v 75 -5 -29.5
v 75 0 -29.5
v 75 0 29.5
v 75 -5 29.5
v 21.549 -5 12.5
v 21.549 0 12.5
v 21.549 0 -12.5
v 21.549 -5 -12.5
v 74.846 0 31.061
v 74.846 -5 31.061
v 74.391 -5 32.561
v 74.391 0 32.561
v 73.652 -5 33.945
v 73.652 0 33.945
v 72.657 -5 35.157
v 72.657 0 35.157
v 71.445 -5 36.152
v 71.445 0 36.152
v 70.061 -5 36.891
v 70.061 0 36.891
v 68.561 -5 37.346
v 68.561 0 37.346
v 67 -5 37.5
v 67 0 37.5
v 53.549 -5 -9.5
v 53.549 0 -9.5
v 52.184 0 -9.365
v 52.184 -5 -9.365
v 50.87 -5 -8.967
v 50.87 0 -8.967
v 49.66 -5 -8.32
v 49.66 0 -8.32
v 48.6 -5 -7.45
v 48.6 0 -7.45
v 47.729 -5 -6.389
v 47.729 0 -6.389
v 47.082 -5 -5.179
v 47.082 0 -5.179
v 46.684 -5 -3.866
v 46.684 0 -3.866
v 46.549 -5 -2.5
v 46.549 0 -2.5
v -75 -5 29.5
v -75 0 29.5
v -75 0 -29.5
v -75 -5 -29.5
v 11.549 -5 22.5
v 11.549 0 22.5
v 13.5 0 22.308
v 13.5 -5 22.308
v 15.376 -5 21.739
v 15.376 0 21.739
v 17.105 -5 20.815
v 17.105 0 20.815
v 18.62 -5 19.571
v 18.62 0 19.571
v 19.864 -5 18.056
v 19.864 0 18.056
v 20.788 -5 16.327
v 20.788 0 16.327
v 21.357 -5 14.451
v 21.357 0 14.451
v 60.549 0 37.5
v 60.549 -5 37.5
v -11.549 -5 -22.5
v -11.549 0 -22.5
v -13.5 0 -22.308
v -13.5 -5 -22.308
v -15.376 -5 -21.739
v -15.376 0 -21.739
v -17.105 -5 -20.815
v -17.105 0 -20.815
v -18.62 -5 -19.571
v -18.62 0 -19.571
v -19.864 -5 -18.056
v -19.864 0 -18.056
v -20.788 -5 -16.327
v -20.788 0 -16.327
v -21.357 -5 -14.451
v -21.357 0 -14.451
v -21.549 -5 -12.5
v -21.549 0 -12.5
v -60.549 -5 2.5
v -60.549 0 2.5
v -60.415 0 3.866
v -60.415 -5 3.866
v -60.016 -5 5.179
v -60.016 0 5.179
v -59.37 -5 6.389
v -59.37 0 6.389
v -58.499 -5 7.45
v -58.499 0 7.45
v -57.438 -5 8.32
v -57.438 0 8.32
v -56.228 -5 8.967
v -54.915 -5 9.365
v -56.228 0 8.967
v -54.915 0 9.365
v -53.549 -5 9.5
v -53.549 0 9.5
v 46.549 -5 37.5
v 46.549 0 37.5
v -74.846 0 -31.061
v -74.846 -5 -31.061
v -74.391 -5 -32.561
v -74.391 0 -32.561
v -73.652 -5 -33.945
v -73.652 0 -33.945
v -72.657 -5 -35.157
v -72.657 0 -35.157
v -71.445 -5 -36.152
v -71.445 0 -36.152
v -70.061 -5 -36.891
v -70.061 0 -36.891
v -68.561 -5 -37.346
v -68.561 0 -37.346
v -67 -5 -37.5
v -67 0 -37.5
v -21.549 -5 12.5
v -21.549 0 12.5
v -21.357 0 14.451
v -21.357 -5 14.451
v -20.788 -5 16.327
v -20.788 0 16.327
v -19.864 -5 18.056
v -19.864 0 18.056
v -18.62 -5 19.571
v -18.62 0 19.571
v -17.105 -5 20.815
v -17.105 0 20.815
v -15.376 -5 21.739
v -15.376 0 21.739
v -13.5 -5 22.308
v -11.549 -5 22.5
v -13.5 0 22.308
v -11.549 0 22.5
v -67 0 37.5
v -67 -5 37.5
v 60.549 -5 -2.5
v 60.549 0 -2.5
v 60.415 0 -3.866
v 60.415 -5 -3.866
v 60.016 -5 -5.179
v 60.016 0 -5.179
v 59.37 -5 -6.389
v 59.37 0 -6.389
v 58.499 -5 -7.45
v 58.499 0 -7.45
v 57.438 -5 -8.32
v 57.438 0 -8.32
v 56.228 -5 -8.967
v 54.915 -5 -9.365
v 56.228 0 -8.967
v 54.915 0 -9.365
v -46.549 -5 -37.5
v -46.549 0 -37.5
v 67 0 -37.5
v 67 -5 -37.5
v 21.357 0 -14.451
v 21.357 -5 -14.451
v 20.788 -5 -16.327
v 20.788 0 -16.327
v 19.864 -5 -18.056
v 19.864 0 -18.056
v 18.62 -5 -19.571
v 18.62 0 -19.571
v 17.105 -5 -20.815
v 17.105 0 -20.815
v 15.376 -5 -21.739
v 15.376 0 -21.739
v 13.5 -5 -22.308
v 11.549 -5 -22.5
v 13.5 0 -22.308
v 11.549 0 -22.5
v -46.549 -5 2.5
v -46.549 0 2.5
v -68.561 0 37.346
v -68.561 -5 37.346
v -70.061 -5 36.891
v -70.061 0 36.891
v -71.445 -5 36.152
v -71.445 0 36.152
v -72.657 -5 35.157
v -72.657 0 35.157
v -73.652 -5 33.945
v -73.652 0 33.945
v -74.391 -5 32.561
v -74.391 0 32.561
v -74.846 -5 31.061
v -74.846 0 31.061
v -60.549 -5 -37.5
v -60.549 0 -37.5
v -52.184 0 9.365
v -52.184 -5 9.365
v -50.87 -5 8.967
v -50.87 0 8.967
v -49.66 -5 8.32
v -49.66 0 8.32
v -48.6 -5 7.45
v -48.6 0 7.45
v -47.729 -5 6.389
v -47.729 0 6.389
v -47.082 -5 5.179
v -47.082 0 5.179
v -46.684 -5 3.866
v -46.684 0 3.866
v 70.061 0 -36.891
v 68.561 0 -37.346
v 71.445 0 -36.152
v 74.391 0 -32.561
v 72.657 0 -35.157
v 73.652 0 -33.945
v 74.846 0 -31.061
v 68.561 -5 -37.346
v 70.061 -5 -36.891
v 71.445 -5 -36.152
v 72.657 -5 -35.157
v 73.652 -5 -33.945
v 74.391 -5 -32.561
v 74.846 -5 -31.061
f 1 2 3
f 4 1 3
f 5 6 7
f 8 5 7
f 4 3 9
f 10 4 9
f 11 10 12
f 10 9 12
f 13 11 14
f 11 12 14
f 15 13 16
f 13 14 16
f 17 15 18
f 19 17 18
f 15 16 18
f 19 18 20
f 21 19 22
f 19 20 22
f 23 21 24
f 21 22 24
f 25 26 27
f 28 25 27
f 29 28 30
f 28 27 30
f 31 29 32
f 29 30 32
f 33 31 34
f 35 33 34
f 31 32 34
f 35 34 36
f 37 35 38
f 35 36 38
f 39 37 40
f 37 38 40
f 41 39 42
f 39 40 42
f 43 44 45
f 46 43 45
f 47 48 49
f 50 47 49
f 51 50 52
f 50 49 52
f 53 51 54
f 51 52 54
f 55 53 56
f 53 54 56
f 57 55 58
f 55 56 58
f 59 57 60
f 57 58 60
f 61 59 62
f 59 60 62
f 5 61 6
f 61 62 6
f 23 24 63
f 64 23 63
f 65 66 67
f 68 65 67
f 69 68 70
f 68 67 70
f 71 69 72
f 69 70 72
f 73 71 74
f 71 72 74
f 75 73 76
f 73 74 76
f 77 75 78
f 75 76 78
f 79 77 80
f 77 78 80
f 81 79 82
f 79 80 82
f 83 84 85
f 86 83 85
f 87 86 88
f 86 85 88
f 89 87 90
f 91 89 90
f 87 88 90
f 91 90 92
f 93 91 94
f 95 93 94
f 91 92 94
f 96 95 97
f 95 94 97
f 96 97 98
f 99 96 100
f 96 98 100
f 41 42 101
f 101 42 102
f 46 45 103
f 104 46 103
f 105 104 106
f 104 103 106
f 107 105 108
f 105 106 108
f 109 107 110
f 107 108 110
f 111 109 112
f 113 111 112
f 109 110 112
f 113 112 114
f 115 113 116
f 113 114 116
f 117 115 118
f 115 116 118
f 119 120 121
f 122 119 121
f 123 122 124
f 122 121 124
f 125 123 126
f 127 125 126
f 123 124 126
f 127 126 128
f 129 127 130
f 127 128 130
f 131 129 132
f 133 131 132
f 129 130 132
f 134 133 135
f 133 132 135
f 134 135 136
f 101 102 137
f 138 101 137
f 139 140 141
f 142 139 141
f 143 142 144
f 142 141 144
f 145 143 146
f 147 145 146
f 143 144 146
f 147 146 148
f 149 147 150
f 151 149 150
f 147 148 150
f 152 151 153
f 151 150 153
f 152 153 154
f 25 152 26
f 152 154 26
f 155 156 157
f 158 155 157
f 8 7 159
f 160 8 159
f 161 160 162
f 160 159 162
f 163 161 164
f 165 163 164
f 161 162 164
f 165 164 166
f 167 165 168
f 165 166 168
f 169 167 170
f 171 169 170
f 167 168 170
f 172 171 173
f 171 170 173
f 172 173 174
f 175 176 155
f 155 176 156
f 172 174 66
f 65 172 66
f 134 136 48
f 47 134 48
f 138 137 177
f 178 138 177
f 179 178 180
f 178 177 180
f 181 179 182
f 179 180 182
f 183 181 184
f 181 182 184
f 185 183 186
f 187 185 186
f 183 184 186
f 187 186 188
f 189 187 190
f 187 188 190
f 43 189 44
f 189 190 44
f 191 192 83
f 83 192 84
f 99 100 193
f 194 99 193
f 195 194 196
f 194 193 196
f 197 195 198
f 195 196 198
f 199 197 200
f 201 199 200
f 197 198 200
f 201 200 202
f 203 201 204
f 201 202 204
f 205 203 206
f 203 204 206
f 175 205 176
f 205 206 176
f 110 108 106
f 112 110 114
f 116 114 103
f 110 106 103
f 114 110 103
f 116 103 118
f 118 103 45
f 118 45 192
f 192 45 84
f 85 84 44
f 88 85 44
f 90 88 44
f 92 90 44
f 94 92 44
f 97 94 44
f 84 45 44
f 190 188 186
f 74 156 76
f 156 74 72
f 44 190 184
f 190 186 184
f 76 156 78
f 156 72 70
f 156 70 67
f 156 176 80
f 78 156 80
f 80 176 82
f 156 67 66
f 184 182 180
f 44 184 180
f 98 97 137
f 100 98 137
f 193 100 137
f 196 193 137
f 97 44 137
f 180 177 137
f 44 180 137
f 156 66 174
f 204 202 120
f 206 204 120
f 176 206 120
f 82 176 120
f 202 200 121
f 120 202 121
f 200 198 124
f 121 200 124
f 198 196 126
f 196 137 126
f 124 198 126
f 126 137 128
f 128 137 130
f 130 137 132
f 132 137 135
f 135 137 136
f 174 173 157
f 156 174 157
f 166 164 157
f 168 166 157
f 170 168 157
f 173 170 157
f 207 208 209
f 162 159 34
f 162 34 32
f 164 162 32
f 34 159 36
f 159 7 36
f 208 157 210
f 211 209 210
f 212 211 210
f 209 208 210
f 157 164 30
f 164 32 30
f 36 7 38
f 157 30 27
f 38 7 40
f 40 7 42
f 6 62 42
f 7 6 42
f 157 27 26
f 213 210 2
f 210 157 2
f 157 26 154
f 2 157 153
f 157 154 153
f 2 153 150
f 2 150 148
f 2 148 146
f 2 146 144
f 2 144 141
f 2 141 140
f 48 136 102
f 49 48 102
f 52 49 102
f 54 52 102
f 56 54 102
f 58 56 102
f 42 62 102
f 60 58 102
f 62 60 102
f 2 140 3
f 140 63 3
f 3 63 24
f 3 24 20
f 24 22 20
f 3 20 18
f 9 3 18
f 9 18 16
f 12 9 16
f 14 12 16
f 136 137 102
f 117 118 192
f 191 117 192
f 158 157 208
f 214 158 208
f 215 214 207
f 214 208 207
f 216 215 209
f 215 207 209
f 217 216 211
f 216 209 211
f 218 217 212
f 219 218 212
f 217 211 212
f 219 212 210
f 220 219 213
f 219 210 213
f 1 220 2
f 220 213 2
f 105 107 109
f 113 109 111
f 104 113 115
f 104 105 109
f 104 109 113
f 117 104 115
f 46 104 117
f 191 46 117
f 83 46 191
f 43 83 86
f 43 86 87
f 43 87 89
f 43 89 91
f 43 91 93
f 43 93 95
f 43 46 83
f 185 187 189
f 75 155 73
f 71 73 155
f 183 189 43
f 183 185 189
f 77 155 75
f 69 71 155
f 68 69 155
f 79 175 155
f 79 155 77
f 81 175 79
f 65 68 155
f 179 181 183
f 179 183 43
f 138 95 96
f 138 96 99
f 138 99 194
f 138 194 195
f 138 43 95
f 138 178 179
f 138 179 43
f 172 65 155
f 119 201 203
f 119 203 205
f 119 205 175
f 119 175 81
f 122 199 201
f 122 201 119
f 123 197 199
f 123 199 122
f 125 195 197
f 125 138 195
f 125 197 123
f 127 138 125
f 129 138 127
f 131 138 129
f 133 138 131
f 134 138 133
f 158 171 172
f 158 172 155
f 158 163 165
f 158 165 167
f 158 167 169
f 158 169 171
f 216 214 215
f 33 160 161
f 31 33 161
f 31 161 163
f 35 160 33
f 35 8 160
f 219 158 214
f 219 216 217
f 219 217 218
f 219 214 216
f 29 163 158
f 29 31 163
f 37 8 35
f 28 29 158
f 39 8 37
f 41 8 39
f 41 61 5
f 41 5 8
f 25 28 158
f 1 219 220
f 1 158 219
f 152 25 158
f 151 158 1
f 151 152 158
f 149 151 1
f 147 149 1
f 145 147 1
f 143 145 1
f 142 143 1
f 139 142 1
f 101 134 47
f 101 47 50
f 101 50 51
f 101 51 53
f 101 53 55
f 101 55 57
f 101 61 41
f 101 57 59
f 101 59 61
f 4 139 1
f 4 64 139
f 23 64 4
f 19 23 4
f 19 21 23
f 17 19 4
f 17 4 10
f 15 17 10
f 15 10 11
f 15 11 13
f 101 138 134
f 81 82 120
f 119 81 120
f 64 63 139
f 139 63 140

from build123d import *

# Parameters (mm, degrees)
F1_DEPTH = 5


with BuildPart() as f1:
    # F0 (on Front) → F1 (new body)
    with BuildSketch(Plane.XZ):
        with BuildLine():
            ThreePointArc((-75, -29.5), (-72.656854, -35.156854), (-67, -37.5))
            Line((-67, -37.5), (-60.549265, -37.5))
            Line((-60.549265, -37.5), (-60.549265, 2.5))
            ThreePointArc((-60.549265, 2.5), (-58.499013, 7.449747), (-53.549265, 9.5))
            ThreePointArc((-53.549265, 9.5), (-48.599518, 7.449747), (-46.549265, 2.5))
            Line((-46.549265, 2.5), (-46.549265, -37.5))
            Line((-46.549265, -37.5), (67, -37.5))
            ThreePointArc((67, -37.5), (72.656854, -35.156854), (75, -29.5))
            Line((75, -29.5), (75, 29.5))
            ThreePointArc((75, 29.5), (72.656854, 35.156854), (67, 37.5))
            Line((67, 37.5), (60.549265, 37.5))
            Line((60.549265, 37.5), (60.549265, -2.5))
            ThreePointArc((60.549265, -2.5), (58.499013, -7.449747), (53.549265, -9.5))
            ThreePointArc((53.549265, -9.5), (48.599518, -7.449747), (46.549265, -2.5))
            Line((46.549265, -2.5), (46.549265, 37.5))
            Line((46.549265, 37.5), (-67, 37.5))
            ThreePointArc((-67, 37.5), (-72.656854, 35.156854), (-75, 29.5))
            Line((-75, 29.5), (-75, -29.5))
        make_face()
        with BuildLine():
            ThreePointArc((-21.549265, 12.5), (-18.620333, 19.571068), (-11.549265, 22.5))
            Line((-11.549265, 22.5), (11.549265, 22.5))
            ThreePointArc((11.549265, 22.5), (18.620333, 19.571068), (21.549265, 12.5))
            Line((21.549265, 12.5), (21.549265, -12.5))
            ThreePointArc((21.549265, -12.5), (18.620333, -19.571068), (11.549265, -22.5))
            Line((11.549265, -22.5), (-11.549265, -22.5))
            ThreePointArc((-11.549265, -22.5), (-18.620333, -19.571068), (-21.549265, -12.5))
            Line((-21.549265, -12.5), (-21.549265, 12.5))
        make_face(mode=Mode.SUBTRACT)
    extrude(amount=F1_DEPTH)


solid = f1.part
